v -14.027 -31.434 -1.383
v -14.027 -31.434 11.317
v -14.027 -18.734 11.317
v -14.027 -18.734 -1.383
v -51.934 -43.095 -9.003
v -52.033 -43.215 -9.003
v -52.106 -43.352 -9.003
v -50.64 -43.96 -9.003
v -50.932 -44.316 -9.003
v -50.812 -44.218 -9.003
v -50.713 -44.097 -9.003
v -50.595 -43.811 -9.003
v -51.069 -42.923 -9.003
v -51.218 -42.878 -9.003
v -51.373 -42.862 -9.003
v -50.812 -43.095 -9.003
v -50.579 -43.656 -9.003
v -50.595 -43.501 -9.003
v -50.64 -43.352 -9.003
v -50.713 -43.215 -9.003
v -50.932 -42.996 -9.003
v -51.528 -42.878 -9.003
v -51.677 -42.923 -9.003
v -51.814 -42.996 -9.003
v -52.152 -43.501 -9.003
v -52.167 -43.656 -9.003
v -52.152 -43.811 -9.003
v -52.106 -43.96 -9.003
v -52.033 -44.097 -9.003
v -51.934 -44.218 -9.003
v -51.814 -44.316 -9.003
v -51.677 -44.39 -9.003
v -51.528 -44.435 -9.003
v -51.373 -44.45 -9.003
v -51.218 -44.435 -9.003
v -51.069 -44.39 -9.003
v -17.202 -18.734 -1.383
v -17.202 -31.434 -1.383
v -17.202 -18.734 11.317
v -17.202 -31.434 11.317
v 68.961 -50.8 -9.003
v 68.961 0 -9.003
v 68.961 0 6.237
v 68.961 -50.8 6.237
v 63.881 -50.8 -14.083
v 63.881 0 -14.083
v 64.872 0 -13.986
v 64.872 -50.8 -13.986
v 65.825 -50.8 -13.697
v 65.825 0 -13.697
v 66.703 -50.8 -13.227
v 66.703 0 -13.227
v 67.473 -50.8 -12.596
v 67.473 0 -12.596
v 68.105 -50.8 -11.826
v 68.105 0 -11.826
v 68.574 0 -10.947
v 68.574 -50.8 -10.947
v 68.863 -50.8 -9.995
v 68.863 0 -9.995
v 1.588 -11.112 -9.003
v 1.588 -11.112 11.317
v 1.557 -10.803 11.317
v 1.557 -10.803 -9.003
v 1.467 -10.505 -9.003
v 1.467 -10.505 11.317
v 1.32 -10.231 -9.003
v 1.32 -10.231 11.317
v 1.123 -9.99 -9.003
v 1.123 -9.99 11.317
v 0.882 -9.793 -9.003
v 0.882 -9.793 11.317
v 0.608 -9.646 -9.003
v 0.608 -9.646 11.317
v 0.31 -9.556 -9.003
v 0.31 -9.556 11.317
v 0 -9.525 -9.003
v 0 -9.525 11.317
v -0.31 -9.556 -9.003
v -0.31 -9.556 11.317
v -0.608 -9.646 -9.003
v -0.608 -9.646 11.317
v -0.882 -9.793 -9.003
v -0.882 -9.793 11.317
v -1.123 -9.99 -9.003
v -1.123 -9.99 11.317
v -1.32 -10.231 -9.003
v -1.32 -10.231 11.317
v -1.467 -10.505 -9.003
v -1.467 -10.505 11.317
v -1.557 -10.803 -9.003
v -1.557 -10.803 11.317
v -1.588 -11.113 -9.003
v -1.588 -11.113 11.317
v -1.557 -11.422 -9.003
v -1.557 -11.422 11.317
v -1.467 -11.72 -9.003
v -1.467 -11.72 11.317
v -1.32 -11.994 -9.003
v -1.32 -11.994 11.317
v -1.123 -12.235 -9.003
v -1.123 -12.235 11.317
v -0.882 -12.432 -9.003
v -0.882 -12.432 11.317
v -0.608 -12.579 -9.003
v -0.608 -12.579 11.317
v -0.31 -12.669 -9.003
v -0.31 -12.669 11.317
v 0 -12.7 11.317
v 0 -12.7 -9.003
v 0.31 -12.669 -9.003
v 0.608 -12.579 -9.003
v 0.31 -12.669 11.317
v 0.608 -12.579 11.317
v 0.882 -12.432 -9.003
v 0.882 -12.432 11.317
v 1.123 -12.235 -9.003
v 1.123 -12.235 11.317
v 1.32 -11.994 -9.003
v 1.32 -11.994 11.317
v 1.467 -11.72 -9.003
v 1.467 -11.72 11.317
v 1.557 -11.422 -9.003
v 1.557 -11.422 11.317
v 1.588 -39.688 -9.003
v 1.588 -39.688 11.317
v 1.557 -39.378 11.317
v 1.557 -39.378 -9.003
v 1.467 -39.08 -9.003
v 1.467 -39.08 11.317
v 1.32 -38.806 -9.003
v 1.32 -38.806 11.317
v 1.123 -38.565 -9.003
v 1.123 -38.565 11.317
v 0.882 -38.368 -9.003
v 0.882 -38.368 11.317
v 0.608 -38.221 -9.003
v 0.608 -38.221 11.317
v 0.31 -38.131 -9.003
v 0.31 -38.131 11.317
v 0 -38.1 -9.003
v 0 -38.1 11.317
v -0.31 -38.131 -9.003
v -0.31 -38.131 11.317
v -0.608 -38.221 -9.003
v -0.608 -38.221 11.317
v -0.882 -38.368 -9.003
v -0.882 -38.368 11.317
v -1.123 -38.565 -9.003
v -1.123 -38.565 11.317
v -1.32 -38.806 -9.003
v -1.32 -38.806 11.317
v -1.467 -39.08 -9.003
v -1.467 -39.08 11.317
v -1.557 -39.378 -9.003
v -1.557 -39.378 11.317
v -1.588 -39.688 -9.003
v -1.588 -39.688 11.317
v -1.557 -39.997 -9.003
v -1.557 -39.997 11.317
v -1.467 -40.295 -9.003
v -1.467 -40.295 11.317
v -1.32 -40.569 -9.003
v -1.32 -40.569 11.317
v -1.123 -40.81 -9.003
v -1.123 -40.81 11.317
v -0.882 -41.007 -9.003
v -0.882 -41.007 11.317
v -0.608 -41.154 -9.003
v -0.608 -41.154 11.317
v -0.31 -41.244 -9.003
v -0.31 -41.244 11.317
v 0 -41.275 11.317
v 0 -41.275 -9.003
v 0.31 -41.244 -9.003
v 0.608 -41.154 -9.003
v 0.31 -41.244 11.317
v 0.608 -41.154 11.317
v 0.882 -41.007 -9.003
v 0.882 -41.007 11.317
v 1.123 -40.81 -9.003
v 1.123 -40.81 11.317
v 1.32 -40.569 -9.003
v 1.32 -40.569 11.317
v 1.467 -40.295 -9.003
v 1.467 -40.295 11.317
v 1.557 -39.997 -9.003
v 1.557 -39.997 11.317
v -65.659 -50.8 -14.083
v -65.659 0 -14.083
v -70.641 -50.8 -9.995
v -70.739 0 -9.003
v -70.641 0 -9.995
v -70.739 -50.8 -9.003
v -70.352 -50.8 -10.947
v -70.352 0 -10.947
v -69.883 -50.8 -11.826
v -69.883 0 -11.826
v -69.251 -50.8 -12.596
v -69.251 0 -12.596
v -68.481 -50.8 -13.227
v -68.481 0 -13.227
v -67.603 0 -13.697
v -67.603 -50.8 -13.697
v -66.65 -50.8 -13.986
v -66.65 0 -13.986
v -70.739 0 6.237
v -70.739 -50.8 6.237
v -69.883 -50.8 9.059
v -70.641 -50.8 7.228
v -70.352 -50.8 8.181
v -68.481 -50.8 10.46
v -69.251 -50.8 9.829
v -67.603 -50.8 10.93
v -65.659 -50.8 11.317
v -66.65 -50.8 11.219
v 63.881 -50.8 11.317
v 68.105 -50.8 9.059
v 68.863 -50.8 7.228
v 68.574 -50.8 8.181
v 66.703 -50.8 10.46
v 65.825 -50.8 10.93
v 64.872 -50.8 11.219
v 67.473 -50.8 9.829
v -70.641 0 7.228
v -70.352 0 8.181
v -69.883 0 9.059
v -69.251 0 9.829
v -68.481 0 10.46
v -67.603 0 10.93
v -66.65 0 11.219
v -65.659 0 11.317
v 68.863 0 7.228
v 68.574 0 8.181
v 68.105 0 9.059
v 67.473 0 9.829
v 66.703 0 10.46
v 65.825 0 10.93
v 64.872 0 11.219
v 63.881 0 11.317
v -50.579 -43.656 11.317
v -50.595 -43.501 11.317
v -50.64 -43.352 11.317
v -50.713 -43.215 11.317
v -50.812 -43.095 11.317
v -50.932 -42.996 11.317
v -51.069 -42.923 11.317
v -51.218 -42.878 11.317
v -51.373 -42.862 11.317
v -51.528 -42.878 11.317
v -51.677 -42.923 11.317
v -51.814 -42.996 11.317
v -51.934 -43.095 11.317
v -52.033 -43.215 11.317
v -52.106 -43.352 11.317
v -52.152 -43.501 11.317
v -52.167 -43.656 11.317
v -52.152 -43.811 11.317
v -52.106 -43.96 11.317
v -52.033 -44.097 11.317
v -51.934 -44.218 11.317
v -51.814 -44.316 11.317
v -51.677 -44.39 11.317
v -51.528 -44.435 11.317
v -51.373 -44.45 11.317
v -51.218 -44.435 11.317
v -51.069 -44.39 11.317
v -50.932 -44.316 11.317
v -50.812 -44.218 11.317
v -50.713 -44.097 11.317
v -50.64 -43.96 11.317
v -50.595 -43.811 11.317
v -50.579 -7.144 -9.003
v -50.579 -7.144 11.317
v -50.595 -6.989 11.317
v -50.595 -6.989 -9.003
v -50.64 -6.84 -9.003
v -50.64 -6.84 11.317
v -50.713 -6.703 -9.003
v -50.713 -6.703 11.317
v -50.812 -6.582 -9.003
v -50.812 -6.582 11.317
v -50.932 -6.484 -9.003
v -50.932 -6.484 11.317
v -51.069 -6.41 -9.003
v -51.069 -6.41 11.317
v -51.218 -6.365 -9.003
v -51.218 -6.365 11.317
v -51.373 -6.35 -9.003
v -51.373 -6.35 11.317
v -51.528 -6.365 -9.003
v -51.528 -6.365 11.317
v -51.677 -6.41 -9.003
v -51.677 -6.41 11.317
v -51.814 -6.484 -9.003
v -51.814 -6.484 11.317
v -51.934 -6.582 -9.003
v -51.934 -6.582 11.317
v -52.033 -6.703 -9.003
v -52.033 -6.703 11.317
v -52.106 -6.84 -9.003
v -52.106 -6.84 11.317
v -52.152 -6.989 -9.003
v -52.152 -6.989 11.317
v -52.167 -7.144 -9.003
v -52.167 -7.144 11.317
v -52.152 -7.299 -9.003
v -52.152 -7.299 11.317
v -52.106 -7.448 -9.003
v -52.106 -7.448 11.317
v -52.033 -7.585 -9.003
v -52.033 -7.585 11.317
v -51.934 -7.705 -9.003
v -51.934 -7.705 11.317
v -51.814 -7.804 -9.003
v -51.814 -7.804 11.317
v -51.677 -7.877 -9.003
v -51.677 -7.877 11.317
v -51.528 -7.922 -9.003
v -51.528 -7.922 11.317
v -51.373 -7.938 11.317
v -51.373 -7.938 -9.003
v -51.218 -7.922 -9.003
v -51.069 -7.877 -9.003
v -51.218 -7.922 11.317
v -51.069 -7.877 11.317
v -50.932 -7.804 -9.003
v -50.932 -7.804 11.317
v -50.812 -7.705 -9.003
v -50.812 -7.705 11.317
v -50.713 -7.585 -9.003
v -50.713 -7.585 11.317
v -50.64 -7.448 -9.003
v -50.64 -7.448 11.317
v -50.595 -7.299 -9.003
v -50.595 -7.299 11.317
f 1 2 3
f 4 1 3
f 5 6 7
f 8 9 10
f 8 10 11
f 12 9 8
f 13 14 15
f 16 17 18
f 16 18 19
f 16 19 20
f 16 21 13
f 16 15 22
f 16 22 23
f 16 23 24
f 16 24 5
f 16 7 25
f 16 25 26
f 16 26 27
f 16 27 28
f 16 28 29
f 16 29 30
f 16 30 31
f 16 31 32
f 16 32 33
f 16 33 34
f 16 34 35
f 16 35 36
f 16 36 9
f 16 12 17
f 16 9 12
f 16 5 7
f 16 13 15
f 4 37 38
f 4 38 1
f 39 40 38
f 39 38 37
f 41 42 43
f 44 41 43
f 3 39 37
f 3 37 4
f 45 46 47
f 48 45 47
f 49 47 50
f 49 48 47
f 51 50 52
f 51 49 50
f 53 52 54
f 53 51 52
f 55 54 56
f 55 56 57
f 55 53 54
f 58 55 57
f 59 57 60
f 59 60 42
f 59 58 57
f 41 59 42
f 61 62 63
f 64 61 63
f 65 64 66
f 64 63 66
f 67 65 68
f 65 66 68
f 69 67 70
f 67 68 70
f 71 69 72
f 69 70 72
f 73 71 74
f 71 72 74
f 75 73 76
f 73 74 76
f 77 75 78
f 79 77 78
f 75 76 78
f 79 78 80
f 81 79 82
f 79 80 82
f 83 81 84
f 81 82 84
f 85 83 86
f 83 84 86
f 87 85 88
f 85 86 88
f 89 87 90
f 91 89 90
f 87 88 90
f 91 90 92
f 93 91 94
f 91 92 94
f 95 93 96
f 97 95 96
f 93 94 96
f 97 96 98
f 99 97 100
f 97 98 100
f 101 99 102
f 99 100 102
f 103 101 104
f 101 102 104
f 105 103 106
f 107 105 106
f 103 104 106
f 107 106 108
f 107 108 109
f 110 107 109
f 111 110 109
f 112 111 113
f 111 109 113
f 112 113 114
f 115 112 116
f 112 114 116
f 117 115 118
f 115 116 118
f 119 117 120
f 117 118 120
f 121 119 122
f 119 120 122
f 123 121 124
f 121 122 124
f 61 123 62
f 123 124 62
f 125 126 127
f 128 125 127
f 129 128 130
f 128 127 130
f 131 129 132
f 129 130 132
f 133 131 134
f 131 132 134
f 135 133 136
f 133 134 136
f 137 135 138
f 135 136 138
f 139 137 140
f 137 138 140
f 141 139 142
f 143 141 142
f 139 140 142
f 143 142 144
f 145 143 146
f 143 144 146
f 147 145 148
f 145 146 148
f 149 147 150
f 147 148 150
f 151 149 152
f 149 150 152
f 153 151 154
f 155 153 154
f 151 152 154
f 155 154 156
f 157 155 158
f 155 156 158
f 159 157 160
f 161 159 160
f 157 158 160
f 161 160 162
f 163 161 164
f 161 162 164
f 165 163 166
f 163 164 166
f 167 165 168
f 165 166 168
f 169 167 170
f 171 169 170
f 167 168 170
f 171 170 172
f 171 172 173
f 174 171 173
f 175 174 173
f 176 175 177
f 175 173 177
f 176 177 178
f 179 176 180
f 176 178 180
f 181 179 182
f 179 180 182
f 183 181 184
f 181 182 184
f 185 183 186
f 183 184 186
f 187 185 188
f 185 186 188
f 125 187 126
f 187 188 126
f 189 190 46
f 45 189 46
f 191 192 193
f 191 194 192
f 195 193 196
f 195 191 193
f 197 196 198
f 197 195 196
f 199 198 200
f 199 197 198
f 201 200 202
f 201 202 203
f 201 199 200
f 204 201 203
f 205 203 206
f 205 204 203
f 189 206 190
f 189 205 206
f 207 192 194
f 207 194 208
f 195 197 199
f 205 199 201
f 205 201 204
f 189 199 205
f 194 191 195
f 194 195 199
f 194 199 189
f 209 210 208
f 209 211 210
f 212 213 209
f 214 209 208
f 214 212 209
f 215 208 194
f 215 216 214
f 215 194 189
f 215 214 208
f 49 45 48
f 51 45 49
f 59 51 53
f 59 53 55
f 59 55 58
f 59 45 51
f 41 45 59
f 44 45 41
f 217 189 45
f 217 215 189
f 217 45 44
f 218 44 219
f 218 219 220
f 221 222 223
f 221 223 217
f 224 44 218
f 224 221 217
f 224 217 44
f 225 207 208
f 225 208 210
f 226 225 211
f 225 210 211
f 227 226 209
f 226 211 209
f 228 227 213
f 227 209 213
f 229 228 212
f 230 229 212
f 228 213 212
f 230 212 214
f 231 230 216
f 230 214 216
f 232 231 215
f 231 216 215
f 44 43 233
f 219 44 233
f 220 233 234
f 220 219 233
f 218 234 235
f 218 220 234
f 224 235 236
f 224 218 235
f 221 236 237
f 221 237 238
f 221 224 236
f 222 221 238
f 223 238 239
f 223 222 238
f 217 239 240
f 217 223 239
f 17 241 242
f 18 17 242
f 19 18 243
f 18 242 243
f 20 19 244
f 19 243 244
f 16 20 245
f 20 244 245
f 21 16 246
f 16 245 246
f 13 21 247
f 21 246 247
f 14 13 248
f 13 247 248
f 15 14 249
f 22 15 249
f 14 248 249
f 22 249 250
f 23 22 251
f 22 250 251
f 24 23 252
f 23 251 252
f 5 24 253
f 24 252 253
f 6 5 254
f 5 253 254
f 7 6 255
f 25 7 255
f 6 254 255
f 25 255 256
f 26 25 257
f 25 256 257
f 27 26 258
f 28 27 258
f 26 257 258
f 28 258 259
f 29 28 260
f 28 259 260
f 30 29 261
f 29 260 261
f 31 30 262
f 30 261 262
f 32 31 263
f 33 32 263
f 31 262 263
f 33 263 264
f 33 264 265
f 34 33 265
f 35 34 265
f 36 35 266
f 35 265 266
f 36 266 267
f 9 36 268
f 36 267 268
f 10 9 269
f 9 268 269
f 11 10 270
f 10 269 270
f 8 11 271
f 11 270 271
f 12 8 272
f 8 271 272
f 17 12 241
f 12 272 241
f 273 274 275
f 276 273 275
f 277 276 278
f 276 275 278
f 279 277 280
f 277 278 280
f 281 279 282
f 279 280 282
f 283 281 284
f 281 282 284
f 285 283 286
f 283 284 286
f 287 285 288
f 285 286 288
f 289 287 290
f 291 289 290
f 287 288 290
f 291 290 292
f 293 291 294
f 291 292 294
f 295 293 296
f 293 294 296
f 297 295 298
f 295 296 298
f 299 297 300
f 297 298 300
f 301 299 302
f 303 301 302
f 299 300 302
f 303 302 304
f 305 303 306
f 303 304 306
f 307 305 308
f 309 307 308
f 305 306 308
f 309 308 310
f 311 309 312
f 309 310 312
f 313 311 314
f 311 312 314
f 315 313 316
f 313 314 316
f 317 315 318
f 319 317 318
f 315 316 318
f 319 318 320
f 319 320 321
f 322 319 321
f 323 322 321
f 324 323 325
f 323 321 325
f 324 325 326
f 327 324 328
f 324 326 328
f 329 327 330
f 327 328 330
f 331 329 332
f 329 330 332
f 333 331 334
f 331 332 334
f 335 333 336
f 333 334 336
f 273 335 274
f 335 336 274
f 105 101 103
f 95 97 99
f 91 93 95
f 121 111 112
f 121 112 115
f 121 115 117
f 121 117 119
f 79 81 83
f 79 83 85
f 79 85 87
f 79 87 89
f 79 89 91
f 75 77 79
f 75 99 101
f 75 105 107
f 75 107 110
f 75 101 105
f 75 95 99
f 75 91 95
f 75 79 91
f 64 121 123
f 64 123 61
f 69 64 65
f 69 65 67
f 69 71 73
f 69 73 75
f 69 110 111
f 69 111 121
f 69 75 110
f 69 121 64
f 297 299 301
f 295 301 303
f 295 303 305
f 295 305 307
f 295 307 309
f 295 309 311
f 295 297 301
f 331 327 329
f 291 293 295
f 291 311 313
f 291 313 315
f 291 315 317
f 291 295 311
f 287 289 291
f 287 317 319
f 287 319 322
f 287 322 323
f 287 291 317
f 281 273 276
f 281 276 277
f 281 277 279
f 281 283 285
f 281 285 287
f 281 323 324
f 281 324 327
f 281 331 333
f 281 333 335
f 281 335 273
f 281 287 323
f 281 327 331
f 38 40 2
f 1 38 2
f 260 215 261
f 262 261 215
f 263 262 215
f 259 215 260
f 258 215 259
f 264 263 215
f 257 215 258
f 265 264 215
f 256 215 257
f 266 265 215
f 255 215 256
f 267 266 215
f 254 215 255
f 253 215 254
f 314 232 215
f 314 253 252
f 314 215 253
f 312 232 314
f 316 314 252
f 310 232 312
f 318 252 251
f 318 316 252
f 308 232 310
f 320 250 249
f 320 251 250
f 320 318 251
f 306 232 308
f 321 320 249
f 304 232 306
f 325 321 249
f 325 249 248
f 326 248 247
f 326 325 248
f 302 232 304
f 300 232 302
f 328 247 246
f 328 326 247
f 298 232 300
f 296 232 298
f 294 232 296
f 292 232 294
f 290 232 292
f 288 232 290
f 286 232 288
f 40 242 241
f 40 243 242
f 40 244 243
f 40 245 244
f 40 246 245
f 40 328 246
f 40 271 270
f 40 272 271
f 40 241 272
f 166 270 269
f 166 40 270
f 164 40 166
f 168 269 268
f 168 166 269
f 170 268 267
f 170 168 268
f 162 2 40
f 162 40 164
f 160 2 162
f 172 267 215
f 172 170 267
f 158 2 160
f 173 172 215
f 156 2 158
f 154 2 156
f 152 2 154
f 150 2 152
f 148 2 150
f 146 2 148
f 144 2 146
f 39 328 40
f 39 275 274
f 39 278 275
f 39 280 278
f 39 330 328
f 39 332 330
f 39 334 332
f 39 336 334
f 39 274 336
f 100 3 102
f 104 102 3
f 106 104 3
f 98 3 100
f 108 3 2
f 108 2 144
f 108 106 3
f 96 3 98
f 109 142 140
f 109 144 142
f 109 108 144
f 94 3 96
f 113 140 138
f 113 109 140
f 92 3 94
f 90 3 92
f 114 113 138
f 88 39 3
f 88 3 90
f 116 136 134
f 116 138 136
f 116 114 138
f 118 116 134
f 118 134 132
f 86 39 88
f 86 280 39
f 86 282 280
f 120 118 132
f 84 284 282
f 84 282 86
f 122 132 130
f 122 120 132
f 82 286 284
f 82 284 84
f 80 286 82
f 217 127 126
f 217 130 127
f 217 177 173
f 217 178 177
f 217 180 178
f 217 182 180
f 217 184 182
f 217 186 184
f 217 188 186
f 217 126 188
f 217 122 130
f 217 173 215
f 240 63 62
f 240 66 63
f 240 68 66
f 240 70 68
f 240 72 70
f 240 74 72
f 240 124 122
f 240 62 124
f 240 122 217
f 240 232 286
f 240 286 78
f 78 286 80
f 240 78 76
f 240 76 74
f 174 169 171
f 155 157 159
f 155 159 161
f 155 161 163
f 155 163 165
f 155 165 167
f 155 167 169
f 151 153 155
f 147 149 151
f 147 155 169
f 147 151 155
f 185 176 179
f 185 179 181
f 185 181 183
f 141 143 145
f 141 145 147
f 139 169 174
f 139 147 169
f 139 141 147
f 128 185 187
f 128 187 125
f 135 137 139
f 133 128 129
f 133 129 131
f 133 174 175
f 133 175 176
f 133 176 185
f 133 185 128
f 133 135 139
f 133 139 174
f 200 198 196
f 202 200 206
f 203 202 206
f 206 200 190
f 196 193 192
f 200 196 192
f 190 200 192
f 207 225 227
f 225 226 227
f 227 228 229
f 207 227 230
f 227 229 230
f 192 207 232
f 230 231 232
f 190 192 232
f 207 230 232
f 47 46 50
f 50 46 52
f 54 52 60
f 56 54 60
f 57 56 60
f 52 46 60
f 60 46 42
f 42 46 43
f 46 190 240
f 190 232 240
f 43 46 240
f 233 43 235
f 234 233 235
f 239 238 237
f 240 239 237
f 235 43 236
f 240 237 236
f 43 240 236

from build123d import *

# Parameters (mm, degrees)
F0_W     = 139.7
F0_H     = 25.4
F1_DEPTH = 50.8
F2_R     = 5.08
F3_R     = 0.79375
F4_DEPTH = 20.32
F5_W     = 3.175
F5_H     = 12.7
F6_DEPTH = 12.7
F7_R     = 1.5875
F8_DEPTH = 20.32


with BuildPart() as f1:
    # F0 (on Front) → F1 (new body)
    with BuildSketch(Plane.XZ):
        with Locations((-0.889001, -1.383466)):
            Rectangle(F0_W, F0_H)
    extrude(amount=F1_DEPTH)

    # F2
    f2_edges = [f1.edges().sort_by_distance(p)[0] for p in [
        (-70.739001, -25.4, 11.316534),
        (-70.739001, -25.4, -14.083466),
        (68.960999, -25.4, 11.316534),
        (68.960999, -25.4, -14.083466),
    ]]
    fillet(f2_edges, radius=F2_R)

    # F3 (on face) → F4 (cut)
    with BuildSketch(Plane.XY.offset(11.316534)):
        with Locations((-51.373154, -7.14375)):
            Circle(F3_R)
        with Locations((-51.373154, -43.65625)):
            Circle(F3_R)
    extrude(amount=-F4_DEPTH, mode=Mode.SUBTRACT)

    # F5 (on face) → F6 (cut)
    with BuildSketch(Plane.XY.offset(11.316534)):
        with Locations((-15.614189, -25.083785)):
            Rectangle(F5_W, F5_H)
    extrude(amount=-F6_DEPTH, mode=Mode.SUBTRACT)

    # F7 (on face) → F8 (cut)
    with BuildSketch(Plane.XY.offset(11.316534)):
        with Locations((0, -11.1125)):
            Circle(F7_R)
        with Locations((0, -39.6875)):
            Circle(F7_R)
    extrude(amount=-F8_DEPTH, mode=Mode.SUBTRACT)


solid = f1.part
